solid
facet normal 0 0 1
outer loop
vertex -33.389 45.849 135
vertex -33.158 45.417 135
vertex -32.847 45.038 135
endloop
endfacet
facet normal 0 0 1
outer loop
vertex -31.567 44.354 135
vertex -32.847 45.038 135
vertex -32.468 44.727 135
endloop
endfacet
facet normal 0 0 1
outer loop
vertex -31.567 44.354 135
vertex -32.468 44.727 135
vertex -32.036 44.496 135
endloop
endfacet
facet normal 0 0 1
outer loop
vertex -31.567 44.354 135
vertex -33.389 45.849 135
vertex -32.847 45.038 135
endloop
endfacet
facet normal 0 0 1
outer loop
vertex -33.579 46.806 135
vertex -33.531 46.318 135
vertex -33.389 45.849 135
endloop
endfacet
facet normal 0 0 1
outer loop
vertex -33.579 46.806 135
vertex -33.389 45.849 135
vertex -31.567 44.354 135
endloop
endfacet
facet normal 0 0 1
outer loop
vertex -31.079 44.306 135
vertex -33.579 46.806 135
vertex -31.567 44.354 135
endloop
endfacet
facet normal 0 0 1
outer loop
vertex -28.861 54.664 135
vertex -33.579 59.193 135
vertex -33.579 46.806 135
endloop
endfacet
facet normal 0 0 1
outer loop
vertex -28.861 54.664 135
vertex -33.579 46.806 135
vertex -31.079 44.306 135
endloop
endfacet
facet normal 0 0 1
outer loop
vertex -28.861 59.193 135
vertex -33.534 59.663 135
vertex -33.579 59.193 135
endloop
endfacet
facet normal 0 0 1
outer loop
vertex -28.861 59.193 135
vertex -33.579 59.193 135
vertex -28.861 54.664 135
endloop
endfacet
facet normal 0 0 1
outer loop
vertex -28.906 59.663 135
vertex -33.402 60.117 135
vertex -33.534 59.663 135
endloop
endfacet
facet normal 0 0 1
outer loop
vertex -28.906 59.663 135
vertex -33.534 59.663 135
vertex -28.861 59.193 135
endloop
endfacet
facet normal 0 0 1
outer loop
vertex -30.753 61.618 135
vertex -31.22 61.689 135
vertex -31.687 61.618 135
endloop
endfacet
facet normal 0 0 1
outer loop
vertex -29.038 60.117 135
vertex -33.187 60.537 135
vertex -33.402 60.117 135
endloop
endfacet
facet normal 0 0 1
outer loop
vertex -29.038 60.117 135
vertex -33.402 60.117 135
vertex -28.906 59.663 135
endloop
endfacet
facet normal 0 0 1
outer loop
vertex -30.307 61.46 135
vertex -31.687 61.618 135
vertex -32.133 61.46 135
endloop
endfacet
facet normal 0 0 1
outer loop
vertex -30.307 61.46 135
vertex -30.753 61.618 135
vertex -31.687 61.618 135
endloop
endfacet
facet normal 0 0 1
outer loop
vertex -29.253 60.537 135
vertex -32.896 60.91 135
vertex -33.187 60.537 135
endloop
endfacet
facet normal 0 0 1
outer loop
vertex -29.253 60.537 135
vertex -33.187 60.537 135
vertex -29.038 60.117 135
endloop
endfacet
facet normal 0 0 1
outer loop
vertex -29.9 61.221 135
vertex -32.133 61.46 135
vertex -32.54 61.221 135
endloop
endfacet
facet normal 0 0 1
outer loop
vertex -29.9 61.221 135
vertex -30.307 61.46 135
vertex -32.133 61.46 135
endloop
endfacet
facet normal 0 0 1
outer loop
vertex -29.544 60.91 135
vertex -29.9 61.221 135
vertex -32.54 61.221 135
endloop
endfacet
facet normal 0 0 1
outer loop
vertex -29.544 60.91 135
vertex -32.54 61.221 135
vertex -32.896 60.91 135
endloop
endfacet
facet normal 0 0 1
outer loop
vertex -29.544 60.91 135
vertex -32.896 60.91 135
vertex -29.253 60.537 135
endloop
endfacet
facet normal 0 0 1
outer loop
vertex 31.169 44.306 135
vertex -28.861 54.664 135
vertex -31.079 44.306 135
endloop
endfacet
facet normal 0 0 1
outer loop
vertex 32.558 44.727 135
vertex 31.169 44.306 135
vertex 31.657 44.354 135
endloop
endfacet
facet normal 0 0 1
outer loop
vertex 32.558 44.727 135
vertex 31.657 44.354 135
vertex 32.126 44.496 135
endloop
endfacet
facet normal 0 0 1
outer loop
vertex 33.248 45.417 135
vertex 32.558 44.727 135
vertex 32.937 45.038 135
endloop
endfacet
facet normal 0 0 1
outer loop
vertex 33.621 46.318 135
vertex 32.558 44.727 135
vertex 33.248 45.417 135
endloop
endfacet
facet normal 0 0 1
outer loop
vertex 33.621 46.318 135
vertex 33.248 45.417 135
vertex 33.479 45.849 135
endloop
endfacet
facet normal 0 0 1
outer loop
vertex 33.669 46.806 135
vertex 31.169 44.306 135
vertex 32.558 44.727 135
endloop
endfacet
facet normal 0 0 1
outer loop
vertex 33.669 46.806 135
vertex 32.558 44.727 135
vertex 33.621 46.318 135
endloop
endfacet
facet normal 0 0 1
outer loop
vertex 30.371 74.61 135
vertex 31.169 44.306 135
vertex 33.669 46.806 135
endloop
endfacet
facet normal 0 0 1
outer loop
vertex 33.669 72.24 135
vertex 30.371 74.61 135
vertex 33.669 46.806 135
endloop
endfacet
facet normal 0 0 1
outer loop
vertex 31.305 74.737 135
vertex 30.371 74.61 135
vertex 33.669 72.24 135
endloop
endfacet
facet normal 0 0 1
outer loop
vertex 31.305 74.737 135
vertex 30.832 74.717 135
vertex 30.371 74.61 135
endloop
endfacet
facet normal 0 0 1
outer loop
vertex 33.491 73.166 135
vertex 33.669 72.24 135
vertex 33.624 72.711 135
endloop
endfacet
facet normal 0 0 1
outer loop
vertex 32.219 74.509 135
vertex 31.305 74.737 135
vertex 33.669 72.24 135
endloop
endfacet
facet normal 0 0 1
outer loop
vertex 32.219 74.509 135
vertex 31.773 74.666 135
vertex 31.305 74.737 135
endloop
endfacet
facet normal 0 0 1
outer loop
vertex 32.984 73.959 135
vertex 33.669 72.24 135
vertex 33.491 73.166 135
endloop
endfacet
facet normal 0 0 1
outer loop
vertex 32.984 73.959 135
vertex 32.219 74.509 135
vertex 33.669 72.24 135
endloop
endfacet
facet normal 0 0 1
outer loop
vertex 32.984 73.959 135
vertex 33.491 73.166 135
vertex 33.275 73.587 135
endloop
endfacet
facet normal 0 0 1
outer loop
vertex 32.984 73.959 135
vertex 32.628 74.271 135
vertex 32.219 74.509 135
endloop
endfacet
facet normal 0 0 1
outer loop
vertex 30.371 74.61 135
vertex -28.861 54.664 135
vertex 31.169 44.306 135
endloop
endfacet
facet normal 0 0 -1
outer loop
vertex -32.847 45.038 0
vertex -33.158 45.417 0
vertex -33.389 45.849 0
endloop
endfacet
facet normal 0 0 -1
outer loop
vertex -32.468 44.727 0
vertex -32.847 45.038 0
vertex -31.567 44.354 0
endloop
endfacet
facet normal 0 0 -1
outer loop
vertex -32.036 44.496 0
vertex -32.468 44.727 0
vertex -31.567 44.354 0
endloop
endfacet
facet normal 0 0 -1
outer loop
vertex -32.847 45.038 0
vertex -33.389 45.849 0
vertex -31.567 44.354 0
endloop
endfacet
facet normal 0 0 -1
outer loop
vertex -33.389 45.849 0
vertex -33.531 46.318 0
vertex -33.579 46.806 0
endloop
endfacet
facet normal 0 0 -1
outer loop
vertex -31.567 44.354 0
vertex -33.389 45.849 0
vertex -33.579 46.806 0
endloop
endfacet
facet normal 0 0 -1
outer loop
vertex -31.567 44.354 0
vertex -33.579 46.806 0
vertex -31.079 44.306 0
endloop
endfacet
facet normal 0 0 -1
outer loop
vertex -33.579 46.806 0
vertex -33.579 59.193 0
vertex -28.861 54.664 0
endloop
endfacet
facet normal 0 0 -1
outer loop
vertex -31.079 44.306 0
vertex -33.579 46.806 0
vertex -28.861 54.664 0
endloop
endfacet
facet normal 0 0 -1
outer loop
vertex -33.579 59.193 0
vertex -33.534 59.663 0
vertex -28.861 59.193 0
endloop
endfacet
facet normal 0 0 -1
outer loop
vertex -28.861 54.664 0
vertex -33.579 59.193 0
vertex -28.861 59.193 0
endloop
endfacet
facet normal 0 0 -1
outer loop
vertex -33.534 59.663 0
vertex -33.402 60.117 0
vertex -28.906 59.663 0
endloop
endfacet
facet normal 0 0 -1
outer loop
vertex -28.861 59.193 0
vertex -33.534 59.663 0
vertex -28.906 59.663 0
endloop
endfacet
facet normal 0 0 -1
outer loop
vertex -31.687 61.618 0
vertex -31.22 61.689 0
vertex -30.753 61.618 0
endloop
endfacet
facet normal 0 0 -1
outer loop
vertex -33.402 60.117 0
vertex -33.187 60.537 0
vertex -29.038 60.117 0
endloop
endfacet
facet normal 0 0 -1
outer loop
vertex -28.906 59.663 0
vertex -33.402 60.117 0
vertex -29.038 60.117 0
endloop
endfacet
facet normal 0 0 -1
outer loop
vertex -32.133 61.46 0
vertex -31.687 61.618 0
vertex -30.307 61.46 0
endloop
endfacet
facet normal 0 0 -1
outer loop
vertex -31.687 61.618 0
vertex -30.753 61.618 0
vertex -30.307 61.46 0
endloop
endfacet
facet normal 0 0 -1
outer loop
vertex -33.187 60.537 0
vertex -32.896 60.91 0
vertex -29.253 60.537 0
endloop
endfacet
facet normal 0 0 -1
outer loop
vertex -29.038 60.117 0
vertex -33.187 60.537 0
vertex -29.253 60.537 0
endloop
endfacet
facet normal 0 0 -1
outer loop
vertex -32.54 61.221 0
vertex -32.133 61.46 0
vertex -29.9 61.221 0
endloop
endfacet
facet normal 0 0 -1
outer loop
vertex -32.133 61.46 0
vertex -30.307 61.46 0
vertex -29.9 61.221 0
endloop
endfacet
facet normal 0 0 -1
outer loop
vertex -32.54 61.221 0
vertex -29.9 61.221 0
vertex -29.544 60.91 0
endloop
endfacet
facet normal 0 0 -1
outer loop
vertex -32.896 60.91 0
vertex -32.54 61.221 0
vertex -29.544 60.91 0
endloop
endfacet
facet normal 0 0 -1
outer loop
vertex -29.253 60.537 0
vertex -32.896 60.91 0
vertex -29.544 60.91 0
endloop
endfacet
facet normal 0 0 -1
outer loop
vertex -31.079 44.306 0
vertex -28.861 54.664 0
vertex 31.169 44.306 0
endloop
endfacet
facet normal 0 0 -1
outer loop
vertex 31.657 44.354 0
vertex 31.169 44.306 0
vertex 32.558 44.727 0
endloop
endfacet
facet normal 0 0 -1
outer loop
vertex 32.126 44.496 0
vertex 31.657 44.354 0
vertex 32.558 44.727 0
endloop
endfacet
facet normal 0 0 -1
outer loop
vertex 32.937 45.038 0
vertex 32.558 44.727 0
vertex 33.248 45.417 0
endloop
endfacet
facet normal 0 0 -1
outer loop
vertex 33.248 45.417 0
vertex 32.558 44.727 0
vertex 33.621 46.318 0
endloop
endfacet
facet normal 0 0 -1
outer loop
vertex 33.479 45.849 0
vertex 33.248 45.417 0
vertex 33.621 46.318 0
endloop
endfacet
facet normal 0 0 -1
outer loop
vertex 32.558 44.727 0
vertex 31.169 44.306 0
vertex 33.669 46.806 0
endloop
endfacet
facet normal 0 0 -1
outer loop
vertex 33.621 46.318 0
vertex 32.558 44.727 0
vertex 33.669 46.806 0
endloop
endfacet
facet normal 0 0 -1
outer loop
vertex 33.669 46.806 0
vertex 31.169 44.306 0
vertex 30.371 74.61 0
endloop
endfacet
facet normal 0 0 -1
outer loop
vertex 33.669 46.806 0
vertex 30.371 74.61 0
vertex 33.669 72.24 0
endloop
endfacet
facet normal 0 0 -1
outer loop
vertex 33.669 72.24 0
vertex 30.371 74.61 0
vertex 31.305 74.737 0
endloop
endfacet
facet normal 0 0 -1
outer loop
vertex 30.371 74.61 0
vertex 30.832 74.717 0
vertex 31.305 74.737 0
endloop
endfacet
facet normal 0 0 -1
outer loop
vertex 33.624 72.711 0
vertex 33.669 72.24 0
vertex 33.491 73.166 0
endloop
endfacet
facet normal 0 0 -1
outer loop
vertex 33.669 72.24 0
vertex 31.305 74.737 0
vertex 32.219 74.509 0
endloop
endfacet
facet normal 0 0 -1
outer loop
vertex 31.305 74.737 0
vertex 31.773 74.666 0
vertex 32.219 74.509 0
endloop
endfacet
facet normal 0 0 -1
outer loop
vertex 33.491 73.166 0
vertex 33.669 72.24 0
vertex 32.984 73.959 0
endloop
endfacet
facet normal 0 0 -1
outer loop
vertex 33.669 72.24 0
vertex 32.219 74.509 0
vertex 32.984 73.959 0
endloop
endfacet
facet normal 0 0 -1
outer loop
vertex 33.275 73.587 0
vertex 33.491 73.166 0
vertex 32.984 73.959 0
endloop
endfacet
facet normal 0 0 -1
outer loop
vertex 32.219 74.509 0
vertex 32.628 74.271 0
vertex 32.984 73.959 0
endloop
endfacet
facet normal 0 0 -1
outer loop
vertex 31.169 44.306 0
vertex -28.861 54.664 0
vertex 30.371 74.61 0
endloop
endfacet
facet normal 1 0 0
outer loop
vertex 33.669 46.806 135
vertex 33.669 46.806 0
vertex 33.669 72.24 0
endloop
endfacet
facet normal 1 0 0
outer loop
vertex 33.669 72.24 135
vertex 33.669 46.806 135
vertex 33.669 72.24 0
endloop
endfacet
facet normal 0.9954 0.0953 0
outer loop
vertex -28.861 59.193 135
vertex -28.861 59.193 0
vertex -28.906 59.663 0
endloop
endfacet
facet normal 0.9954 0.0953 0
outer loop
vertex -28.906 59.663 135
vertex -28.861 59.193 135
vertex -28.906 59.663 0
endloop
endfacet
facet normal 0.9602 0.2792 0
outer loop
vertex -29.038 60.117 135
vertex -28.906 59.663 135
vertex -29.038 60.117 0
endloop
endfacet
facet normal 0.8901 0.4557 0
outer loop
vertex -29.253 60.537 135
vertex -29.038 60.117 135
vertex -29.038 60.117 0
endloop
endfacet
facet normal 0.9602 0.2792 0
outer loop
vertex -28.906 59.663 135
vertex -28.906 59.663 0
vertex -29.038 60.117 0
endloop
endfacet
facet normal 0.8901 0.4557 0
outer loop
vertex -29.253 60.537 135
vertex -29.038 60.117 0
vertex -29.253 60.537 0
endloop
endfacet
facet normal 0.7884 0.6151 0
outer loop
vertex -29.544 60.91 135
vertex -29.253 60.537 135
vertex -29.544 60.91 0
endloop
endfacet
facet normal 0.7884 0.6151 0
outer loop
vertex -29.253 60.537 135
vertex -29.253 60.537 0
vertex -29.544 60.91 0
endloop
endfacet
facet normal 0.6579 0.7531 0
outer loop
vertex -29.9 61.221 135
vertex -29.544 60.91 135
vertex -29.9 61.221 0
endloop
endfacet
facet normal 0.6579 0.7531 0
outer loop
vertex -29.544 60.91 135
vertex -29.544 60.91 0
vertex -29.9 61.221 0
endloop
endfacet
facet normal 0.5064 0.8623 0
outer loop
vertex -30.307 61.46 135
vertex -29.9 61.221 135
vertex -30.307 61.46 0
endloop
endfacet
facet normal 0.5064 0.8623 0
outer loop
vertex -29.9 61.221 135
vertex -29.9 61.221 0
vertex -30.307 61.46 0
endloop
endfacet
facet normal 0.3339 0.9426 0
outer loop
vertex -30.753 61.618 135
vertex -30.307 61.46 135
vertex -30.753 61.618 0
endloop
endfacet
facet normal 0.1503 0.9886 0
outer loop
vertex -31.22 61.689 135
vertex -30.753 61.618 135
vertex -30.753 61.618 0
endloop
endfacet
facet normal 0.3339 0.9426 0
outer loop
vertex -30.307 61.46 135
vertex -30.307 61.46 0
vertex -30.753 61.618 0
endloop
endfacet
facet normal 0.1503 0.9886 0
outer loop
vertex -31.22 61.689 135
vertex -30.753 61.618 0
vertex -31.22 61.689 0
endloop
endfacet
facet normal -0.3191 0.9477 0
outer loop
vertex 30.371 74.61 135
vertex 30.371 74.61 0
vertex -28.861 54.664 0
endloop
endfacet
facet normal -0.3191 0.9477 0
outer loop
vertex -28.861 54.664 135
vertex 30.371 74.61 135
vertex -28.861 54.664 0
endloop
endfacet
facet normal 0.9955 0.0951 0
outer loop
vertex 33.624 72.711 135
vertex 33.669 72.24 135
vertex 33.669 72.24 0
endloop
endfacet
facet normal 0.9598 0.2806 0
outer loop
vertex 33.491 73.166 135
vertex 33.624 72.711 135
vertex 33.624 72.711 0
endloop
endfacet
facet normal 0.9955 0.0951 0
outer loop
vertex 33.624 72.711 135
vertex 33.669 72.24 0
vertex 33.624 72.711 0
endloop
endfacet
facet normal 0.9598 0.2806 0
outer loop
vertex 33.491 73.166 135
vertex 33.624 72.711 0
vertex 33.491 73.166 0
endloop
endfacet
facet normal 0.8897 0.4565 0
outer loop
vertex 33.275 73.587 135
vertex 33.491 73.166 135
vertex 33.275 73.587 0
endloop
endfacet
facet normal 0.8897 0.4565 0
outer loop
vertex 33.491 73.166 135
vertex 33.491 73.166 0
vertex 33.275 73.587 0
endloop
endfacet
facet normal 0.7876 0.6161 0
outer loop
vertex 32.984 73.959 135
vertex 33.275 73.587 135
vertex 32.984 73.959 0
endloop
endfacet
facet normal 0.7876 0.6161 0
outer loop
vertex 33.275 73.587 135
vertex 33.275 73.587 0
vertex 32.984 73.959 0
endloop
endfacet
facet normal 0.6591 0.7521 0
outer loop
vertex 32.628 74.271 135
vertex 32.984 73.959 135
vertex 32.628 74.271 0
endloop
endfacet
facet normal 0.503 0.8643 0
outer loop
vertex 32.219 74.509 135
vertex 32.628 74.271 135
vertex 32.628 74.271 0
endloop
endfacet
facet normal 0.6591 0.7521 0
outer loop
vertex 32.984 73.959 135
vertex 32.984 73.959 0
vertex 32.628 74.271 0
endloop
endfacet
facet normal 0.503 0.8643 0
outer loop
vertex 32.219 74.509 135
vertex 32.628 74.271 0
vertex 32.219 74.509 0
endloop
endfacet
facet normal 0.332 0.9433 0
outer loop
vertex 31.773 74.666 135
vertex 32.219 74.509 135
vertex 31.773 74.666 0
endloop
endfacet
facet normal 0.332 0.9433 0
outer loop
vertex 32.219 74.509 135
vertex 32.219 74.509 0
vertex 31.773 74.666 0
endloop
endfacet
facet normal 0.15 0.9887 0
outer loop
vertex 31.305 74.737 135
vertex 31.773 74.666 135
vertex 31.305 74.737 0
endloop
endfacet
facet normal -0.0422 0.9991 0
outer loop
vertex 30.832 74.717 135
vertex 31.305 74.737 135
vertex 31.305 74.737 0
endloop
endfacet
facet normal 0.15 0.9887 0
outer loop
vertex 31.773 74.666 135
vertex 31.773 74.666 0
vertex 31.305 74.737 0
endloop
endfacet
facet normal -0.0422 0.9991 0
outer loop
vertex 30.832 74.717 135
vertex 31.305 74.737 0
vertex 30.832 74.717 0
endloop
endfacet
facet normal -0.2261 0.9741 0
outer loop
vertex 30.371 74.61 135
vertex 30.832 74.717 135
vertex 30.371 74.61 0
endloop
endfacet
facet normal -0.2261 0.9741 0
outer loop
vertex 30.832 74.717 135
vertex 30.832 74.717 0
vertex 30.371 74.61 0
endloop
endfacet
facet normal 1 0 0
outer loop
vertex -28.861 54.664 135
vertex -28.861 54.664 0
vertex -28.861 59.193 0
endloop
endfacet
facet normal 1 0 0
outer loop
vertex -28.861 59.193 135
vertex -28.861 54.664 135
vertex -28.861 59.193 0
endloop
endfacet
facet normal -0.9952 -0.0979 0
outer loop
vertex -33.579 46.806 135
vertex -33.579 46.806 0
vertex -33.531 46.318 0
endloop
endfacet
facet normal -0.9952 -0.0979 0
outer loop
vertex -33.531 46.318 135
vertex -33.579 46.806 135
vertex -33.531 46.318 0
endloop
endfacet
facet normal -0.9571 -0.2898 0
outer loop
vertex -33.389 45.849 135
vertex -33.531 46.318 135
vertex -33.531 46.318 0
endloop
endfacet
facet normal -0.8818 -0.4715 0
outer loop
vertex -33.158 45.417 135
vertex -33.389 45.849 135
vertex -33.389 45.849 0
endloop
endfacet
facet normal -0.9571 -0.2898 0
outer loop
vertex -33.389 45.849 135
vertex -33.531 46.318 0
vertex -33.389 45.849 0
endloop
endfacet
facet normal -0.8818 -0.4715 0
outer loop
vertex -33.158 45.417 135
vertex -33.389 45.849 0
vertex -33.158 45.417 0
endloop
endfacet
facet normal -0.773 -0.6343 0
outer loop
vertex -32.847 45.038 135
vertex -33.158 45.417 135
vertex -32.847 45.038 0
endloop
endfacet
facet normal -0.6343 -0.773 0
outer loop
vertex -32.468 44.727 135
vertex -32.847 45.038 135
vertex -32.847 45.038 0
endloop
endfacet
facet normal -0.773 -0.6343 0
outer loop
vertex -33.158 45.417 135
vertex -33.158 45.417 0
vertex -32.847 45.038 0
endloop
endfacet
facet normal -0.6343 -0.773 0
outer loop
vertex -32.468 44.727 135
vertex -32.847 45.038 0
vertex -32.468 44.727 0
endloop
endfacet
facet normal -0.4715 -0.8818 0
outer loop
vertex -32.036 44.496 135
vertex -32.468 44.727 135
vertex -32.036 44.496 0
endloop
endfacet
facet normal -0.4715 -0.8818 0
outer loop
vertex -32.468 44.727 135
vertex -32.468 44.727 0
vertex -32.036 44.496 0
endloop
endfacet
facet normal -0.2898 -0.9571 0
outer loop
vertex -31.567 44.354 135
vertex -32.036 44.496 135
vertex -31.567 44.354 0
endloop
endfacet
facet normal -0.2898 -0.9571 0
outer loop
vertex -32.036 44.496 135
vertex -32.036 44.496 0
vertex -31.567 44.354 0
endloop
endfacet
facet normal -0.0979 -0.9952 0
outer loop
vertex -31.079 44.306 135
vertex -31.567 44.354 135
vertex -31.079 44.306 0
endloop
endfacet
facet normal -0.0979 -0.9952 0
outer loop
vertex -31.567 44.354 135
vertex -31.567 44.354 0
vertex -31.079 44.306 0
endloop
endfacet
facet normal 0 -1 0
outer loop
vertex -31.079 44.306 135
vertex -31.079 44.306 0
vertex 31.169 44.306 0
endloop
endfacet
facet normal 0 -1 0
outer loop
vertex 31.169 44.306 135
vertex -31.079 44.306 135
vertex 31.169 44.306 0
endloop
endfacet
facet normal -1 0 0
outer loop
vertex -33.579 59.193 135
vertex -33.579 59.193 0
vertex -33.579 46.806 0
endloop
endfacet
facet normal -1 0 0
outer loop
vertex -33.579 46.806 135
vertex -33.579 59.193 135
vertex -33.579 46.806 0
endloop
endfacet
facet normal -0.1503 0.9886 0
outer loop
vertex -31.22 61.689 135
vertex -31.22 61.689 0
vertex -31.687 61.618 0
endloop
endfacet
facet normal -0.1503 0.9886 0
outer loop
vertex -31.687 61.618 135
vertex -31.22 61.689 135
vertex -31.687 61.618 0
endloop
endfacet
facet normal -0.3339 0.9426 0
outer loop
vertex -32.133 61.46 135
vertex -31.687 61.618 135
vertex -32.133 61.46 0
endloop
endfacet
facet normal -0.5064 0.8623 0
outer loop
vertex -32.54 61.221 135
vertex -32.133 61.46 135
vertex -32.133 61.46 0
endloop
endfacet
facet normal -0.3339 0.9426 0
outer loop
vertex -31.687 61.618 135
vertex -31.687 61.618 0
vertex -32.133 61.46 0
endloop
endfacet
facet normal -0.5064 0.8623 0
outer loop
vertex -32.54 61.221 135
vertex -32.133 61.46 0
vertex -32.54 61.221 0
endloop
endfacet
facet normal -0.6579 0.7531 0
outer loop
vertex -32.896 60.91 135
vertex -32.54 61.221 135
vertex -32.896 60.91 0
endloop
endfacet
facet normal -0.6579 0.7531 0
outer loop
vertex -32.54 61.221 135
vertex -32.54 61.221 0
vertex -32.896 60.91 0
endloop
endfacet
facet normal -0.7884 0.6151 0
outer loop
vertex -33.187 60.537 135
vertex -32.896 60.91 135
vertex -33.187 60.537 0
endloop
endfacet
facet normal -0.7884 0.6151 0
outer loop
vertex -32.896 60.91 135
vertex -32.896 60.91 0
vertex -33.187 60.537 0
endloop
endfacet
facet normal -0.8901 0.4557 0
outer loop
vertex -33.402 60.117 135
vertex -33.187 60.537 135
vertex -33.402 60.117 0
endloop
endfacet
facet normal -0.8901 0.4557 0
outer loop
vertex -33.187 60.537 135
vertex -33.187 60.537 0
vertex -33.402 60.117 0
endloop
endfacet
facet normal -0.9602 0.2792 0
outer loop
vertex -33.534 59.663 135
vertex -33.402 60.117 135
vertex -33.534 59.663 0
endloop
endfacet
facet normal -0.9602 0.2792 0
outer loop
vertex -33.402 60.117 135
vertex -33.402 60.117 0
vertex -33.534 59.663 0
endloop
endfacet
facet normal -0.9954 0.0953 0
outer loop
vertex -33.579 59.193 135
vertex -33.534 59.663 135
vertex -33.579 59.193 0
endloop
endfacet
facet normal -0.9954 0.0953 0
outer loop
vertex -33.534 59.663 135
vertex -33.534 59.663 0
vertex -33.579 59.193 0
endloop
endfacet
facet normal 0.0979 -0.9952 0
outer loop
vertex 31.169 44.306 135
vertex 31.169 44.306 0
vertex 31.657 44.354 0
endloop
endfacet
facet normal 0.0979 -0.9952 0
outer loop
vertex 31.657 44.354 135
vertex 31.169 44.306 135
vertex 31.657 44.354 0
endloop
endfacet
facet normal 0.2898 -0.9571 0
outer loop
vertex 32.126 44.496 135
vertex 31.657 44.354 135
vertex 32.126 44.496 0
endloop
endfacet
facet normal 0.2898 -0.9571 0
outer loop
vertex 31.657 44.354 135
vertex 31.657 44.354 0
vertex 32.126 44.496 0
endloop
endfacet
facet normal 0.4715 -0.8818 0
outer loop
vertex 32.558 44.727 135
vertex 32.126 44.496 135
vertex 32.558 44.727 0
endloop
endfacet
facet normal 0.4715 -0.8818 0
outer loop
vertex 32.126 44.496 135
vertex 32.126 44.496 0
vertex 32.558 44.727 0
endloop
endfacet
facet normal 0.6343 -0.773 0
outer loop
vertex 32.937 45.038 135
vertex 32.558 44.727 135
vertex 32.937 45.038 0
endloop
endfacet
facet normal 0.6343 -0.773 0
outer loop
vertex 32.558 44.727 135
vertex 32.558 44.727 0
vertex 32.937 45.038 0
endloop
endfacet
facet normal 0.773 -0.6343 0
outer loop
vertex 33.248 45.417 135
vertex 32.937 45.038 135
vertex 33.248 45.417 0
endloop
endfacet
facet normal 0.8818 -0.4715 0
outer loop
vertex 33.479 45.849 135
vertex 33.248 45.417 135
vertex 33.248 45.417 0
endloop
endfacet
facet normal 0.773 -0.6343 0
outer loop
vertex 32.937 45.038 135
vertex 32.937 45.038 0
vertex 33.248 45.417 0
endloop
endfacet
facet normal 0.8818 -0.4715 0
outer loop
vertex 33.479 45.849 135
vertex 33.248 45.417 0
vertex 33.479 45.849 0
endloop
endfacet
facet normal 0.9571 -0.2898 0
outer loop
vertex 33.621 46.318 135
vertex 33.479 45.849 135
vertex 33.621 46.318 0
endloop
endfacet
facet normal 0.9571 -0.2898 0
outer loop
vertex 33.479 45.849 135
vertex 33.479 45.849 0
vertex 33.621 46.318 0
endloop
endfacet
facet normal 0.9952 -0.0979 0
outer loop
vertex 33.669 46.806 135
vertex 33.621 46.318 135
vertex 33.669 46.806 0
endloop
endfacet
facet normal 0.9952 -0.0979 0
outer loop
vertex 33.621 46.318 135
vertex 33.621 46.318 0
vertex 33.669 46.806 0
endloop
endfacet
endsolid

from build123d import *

# Parameters (mm, degrees)
F1_DEPTH = 135


with BuildPart() as f1:
    # F0 (on Top) → F1 (new body)
    with BuildSketch(Plane.XY):
        with BuildLine():
            Line((30.371132, 74.60952), (-28.860857, 54.664055))
            Line((-28.860857, 54.664055), (-28.860857, 59.192702))
            ThreePointArc((-28.860857, 59.192702), (-29.543952, 60.909926), (-31.219943, 61.688728))
            ThreePointArc((-31.219943, 61.688728), (-32.895934, 60.909926), (-33.57903, 59.192702))
            Line((-33.57903, 59.192702), (-33.57903, 46.806118))
            ThreePointArc((-33.57903, 46.806118), (-32.846797, 45.038351), (-31.07903, 44.306118))
            Line((-31.07903, 44.306118), (31.16895, 44.306118))
            ThreePointArc((31.16895, 44.306118), (32.936717, 45.038351), (33.66895, 46.806118))
            Line((33.66895, 46.806118), (33.66895, 72.240241))
            ThreePointArc((33.66895, 72.240241), (32.627623, 74.270579), (30.371132, 74.60952))
        make_face()
    extrude(amount=F1_DEPTH)


solid = f1.part
